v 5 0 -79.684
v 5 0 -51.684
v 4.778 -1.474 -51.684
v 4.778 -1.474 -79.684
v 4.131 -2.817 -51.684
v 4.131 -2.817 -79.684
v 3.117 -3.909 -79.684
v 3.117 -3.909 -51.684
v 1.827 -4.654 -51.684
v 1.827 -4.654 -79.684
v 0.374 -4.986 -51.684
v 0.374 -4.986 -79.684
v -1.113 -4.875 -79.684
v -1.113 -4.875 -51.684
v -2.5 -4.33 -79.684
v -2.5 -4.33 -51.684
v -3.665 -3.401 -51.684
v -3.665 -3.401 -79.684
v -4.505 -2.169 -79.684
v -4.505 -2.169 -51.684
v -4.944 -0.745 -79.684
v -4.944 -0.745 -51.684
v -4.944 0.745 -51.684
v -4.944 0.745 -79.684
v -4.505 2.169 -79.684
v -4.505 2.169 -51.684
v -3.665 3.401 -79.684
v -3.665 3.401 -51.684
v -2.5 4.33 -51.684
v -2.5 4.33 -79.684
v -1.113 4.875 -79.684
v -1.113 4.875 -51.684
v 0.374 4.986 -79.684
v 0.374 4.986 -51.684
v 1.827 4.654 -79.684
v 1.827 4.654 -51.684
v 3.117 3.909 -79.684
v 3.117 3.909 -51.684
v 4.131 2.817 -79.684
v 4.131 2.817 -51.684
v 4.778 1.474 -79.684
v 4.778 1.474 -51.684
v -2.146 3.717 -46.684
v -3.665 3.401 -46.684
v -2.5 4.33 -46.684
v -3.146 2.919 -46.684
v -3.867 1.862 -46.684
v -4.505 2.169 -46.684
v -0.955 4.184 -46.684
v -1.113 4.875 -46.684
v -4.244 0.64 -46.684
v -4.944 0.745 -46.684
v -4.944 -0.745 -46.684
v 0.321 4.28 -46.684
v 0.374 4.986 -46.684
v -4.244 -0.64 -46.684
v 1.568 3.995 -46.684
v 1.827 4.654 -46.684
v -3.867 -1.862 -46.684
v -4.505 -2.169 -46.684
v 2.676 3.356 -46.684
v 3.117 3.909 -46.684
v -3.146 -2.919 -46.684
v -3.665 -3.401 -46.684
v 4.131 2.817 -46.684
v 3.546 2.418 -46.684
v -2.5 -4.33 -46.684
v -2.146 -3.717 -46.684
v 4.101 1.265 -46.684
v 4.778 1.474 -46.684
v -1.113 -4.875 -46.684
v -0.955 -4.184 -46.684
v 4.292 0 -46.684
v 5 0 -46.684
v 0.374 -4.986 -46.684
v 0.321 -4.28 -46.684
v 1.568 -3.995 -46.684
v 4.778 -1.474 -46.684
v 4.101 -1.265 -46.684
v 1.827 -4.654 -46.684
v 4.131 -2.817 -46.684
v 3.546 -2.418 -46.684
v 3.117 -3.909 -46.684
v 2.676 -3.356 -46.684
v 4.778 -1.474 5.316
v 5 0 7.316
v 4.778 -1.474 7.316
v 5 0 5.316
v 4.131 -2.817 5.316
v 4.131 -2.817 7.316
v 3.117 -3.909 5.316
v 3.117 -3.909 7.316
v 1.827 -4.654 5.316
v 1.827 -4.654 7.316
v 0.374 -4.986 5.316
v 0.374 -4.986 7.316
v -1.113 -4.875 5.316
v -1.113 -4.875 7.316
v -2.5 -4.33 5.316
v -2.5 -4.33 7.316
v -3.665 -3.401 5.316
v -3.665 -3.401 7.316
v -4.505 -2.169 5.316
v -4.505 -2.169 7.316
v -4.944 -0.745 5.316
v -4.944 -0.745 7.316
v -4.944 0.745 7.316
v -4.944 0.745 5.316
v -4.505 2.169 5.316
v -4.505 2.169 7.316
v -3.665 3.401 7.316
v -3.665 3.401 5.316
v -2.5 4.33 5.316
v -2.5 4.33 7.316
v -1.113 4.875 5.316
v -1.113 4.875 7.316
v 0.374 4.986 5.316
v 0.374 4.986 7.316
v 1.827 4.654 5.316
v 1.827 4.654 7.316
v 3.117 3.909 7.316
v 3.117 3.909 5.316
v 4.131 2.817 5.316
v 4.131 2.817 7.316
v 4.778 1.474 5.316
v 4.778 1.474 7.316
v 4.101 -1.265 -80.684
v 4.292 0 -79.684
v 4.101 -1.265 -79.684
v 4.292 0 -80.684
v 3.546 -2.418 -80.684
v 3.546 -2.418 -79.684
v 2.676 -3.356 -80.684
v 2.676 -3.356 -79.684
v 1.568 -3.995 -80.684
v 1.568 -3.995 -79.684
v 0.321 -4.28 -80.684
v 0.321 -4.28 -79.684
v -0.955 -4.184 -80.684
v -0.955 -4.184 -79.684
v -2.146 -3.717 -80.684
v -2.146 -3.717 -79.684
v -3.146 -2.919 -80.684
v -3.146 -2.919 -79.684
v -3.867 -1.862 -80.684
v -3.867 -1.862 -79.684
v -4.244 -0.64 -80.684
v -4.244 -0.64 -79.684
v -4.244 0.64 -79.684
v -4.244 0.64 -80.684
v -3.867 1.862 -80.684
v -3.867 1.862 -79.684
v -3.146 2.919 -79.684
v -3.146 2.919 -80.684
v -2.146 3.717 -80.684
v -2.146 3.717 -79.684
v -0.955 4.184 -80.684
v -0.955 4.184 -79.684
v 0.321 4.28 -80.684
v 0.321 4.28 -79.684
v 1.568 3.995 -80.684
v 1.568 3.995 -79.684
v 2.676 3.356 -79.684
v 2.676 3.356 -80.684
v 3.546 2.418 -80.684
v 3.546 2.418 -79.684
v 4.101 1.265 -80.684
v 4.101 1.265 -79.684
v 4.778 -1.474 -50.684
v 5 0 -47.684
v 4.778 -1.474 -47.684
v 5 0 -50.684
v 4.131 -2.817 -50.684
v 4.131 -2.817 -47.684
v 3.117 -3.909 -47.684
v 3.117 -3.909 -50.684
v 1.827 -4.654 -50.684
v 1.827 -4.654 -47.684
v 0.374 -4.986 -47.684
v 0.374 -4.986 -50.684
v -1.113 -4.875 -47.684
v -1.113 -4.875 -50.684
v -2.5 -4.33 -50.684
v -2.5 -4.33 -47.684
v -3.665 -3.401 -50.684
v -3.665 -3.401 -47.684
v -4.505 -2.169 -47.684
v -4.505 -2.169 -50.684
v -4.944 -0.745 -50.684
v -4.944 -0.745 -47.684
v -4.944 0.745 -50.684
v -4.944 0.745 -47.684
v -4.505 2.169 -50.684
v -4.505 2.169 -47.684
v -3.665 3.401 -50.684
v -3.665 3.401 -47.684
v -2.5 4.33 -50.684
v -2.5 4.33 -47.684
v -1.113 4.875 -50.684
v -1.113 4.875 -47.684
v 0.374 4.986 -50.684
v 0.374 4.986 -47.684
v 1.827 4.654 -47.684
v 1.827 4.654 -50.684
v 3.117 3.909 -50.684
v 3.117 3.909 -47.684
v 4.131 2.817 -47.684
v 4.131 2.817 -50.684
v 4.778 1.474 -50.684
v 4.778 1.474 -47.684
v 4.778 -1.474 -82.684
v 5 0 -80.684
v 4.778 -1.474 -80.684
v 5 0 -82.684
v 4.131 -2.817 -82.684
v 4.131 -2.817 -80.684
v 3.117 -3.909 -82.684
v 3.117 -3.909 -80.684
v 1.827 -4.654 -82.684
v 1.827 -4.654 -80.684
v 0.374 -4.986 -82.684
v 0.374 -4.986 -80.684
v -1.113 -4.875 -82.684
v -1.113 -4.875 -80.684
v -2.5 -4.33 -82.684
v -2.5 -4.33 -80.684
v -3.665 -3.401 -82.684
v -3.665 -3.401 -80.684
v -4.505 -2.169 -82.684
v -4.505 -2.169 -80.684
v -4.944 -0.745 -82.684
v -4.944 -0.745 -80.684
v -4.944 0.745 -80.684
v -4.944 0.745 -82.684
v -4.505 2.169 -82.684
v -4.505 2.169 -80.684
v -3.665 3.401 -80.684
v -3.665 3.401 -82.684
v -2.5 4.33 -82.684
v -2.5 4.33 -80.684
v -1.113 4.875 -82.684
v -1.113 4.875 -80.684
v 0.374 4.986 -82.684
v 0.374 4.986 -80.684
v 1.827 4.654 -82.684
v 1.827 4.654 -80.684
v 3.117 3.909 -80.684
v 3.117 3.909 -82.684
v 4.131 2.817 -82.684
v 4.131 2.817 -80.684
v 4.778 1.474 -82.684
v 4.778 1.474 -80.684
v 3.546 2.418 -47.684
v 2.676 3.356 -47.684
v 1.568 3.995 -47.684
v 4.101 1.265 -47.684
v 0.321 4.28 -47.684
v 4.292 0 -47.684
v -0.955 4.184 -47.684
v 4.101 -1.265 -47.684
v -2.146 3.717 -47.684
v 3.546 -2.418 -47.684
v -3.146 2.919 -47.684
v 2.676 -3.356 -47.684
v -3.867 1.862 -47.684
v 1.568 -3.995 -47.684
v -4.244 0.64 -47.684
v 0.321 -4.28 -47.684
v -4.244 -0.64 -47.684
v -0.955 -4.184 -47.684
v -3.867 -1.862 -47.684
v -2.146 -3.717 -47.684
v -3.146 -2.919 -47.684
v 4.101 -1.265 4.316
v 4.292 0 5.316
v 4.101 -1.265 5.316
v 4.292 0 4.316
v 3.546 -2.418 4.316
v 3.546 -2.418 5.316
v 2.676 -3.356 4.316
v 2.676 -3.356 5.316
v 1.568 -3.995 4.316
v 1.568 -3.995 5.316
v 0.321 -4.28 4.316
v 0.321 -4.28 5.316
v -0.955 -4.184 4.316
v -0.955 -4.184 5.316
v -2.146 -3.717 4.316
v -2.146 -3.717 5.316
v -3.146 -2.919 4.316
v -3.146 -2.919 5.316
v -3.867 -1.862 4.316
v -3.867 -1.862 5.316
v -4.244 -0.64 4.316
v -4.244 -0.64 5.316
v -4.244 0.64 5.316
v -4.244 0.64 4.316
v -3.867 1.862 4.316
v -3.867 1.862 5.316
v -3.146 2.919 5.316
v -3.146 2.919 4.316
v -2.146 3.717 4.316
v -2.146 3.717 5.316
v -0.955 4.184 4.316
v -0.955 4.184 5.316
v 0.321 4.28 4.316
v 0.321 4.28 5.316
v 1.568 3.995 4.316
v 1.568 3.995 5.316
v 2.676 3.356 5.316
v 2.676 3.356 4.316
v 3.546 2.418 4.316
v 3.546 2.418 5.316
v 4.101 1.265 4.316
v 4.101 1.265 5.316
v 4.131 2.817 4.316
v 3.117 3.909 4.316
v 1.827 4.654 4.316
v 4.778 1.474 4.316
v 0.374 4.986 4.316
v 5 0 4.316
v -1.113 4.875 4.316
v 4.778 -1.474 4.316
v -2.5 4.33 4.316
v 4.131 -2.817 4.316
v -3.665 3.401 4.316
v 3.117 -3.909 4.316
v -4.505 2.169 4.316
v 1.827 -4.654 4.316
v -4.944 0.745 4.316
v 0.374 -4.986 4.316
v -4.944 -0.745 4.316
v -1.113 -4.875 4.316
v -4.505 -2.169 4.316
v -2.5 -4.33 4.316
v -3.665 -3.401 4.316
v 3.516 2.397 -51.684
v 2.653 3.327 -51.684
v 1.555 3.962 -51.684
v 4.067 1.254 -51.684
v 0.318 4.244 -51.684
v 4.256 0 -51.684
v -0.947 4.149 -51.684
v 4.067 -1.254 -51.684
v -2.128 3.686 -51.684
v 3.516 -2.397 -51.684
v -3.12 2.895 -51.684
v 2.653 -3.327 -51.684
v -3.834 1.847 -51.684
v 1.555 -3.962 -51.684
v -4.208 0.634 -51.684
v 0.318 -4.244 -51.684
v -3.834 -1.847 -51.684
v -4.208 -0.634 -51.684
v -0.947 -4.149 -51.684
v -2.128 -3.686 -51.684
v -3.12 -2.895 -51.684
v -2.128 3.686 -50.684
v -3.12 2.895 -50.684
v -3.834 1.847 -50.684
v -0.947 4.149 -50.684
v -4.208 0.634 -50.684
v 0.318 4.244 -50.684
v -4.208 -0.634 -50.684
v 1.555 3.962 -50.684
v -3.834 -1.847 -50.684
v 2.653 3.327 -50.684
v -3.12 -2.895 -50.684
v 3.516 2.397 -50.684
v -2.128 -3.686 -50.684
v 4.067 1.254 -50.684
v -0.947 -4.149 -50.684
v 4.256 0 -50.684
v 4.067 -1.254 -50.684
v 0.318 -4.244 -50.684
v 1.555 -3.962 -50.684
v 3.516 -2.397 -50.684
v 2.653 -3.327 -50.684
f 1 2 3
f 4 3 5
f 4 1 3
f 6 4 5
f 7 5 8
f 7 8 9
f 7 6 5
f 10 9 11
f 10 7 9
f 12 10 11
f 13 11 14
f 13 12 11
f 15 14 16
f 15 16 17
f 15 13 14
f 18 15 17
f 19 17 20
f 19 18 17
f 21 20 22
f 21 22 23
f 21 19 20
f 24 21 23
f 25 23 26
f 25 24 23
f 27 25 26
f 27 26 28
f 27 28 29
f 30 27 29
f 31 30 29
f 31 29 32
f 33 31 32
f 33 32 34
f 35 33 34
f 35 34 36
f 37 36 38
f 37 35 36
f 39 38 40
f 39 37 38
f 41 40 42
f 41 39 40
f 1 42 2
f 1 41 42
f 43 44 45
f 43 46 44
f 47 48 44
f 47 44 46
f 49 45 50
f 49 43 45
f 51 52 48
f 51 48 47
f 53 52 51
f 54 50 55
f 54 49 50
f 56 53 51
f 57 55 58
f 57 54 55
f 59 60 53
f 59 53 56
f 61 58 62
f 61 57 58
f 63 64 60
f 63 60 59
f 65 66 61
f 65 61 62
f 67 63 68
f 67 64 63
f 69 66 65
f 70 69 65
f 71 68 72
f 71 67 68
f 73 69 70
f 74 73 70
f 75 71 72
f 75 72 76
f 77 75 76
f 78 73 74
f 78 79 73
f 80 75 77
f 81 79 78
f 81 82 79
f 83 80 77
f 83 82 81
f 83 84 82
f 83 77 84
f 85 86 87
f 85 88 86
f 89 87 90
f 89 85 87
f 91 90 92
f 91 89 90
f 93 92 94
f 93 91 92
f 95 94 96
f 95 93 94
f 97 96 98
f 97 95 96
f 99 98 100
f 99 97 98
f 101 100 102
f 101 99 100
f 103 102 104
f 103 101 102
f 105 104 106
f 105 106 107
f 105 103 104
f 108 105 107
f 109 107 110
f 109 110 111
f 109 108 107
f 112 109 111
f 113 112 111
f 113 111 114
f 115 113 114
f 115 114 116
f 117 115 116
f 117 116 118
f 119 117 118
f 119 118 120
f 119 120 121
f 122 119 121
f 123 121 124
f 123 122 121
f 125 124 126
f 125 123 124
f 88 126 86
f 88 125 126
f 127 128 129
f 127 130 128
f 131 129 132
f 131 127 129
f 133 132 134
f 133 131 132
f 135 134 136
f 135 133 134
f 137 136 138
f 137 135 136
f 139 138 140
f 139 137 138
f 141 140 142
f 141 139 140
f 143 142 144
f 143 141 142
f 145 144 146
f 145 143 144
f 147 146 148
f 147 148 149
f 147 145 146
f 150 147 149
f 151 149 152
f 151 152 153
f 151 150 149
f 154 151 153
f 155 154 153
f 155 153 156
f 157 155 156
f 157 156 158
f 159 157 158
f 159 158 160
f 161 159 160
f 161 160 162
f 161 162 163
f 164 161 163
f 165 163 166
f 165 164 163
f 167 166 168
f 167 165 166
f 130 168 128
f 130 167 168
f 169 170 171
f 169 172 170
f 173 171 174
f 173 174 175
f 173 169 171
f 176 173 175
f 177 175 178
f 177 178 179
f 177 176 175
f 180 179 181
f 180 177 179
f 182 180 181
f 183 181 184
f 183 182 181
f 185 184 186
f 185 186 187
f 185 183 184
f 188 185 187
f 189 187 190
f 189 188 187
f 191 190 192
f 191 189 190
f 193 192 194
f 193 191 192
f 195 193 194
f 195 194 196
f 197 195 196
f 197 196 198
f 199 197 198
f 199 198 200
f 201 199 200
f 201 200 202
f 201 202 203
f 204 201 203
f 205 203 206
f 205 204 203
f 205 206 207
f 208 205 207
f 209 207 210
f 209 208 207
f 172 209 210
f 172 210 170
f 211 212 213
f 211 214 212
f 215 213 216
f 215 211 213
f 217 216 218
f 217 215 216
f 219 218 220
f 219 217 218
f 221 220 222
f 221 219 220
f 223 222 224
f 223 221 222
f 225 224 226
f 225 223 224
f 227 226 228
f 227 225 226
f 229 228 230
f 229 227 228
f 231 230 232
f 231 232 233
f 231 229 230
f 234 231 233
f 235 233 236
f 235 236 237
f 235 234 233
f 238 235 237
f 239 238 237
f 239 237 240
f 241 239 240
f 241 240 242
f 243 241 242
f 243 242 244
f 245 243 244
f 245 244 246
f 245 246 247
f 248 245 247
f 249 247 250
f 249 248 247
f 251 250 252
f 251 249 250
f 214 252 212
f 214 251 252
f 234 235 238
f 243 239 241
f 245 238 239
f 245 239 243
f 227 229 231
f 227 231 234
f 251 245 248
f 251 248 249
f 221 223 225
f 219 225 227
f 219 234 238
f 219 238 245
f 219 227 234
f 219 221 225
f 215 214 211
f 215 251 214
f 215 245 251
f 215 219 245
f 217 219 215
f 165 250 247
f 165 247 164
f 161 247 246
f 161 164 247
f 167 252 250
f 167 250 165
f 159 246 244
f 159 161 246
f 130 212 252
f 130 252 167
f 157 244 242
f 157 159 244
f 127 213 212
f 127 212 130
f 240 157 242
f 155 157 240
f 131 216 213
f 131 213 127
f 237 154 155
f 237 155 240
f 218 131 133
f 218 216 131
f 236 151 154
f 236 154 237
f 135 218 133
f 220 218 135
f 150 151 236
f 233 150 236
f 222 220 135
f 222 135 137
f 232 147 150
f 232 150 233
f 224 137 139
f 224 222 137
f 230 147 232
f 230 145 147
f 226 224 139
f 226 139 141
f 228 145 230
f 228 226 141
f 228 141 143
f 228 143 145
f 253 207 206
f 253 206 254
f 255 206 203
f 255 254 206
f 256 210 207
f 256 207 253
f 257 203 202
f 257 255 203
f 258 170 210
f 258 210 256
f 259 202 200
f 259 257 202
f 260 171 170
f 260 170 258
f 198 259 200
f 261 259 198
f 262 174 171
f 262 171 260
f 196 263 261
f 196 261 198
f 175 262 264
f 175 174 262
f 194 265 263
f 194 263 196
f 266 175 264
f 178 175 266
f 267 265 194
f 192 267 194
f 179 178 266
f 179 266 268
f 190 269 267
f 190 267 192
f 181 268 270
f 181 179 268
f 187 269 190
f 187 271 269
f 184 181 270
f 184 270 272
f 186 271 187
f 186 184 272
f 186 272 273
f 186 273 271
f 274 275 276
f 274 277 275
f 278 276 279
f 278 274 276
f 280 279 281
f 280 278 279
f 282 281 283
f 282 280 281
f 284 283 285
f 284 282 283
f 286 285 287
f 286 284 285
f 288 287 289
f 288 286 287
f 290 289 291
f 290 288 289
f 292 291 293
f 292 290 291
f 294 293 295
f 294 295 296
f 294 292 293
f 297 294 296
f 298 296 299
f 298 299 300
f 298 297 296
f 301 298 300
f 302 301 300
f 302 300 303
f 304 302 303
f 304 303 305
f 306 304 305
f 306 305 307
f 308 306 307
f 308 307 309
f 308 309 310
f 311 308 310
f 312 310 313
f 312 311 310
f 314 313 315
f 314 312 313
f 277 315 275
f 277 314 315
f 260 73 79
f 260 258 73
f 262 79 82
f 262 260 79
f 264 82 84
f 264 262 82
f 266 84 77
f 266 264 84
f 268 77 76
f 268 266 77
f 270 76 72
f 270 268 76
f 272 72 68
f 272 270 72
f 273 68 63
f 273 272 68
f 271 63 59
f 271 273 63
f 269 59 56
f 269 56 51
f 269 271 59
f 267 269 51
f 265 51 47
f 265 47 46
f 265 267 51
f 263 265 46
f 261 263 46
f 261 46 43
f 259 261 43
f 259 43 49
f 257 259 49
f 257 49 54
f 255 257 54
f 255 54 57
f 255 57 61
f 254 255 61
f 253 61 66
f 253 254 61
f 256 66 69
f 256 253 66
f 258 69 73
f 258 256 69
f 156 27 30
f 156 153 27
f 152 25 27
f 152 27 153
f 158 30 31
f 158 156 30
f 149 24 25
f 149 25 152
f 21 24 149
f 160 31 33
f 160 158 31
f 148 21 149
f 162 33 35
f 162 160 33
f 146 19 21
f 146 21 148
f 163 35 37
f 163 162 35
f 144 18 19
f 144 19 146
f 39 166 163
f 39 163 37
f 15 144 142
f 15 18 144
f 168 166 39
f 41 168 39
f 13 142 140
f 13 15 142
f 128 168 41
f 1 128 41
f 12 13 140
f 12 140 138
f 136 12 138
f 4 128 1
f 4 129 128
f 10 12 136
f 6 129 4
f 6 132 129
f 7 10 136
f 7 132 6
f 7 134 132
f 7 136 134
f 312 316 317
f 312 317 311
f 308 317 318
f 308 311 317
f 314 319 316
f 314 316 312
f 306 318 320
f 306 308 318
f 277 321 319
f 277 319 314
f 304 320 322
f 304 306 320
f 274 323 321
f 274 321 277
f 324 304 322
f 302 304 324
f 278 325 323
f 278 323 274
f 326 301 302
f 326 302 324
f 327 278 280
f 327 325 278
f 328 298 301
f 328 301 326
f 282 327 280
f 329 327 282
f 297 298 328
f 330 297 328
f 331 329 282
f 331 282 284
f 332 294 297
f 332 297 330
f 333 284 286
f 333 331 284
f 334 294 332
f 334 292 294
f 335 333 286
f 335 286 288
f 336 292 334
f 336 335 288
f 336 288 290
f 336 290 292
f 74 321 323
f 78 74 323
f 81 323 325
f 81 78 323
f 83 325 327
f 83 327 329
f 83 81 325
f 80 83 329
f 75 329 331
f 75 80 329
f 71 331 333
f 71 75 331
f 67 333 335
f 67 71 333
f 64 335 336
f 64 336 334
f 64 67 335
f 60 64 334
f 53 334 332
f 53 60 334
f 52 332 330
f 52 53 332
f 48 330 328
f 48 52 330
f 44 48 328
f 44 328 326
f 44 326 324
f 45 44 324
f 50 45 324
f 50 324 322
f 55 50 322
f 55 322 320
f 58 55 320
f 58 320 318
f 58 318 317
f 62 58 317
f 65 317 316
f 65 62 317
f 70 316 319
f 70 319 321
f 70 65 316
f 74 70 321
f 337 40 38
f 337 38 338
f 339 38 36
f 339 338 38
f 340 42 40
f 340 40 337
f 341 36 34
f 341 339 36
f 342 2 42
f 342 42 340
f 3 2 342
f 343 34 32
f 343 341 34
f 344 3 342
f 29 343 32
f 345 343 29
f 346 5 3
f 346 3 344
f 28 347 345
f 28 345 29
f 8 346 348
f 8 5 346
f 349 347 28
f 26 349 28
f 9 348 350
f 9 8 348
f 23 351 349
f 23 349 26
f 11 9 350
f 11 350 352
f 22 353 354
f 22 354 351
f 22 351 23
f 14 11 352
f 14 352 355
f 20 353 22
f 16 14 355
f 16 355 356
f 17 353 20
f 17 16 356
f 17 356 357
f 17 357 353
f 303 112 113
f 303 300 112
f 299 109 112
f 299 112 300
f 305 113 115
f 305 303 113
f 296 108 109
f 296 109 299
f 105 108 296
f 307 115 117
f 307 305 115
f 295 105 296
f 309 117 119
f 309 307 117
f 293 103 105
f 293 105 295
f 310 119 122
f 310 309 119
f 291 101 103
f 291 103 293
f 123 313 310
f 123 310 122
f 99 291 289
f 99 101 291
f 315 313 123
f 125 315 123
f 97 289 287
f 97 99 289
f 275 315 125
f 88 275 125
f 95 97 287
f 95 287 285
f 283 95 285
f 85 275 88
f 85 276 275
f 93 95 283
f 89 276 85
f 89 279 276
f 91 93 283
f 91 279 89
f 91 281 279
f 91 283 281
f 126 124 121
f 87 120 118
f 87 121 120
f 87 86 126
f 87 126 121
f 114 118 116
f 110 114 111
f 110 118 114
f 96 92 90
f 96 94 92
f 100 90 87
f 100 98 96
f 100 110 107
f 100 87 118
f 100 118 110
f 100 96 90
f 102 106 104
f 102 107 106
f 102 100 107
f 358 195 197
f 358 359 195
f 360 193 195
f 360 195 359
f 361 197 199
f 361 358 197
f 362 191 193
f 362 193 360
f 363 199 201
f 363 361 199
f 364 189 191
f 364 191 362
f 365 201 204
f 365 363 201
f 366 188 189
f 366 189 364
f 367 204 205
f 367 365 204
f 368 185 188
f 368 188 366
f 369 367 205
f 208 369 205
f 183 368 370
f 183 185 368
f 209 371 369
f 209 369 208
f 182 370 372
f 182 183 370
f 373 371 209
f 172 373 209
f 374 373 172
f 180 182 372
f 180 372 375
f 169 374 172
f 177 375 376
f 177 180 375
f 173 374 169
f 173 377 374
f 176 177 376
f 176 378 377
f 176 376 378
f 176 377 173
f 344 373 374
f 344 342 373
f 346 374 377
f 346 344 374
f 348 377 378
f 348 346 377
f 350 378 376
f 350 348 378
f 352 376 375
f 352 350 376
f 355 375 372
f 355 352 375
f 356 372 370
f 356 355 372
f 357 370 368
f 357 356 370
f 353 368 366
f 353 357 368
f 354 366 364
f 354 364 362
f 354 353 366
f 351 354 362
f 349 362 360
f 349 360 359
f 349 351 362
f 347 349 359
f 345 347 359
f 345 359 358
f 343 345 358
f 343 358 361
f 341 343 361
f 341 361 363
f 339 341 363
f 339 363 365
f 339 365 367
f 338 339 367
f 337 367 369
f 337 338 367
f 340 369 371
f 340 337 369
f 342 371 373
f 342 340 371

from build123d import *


with BuildPart() as part:
    # Skizze1 → Rotation1 (revolve)
    with BuildSketch(Plane(origin=(0, 0, 0), x_dir=(0, 0, -1), z_dir=(1, 0, 0)), mode=Mode.PRIVATE) as rotation1_sk:
        Polygon((-7.315845432, 0), (-7.315845432, 5), (-5.315845432, 5), (-5.315845432, 4.292030432), (-4.315845432, 4.292030432), (-4.315845432, 5), (46.684154568, 5), (46.684154568, 4.292030432), (47.684154568, 4.292030432), (47.684154568, 5), (50.684154568, 5), (50.684154568, 4.255858279), (51.684154568, 4.255858279), (51.684154568, 5), (79.684154568, 5), (79.684154568, 4.292030432), (80.684154568, 4.292030432), (80.684154568, 5), (82.684154568, 5), (82.684154568, 0), align=None)
    revolve(rotation1_sk.sketch.rotate(Axis((0, 0, 7.315845432), (0, 0, -1)), 90), axis=Axis((0, 0, 7.315845432), (0, 0, -1)))


solid = part.part
